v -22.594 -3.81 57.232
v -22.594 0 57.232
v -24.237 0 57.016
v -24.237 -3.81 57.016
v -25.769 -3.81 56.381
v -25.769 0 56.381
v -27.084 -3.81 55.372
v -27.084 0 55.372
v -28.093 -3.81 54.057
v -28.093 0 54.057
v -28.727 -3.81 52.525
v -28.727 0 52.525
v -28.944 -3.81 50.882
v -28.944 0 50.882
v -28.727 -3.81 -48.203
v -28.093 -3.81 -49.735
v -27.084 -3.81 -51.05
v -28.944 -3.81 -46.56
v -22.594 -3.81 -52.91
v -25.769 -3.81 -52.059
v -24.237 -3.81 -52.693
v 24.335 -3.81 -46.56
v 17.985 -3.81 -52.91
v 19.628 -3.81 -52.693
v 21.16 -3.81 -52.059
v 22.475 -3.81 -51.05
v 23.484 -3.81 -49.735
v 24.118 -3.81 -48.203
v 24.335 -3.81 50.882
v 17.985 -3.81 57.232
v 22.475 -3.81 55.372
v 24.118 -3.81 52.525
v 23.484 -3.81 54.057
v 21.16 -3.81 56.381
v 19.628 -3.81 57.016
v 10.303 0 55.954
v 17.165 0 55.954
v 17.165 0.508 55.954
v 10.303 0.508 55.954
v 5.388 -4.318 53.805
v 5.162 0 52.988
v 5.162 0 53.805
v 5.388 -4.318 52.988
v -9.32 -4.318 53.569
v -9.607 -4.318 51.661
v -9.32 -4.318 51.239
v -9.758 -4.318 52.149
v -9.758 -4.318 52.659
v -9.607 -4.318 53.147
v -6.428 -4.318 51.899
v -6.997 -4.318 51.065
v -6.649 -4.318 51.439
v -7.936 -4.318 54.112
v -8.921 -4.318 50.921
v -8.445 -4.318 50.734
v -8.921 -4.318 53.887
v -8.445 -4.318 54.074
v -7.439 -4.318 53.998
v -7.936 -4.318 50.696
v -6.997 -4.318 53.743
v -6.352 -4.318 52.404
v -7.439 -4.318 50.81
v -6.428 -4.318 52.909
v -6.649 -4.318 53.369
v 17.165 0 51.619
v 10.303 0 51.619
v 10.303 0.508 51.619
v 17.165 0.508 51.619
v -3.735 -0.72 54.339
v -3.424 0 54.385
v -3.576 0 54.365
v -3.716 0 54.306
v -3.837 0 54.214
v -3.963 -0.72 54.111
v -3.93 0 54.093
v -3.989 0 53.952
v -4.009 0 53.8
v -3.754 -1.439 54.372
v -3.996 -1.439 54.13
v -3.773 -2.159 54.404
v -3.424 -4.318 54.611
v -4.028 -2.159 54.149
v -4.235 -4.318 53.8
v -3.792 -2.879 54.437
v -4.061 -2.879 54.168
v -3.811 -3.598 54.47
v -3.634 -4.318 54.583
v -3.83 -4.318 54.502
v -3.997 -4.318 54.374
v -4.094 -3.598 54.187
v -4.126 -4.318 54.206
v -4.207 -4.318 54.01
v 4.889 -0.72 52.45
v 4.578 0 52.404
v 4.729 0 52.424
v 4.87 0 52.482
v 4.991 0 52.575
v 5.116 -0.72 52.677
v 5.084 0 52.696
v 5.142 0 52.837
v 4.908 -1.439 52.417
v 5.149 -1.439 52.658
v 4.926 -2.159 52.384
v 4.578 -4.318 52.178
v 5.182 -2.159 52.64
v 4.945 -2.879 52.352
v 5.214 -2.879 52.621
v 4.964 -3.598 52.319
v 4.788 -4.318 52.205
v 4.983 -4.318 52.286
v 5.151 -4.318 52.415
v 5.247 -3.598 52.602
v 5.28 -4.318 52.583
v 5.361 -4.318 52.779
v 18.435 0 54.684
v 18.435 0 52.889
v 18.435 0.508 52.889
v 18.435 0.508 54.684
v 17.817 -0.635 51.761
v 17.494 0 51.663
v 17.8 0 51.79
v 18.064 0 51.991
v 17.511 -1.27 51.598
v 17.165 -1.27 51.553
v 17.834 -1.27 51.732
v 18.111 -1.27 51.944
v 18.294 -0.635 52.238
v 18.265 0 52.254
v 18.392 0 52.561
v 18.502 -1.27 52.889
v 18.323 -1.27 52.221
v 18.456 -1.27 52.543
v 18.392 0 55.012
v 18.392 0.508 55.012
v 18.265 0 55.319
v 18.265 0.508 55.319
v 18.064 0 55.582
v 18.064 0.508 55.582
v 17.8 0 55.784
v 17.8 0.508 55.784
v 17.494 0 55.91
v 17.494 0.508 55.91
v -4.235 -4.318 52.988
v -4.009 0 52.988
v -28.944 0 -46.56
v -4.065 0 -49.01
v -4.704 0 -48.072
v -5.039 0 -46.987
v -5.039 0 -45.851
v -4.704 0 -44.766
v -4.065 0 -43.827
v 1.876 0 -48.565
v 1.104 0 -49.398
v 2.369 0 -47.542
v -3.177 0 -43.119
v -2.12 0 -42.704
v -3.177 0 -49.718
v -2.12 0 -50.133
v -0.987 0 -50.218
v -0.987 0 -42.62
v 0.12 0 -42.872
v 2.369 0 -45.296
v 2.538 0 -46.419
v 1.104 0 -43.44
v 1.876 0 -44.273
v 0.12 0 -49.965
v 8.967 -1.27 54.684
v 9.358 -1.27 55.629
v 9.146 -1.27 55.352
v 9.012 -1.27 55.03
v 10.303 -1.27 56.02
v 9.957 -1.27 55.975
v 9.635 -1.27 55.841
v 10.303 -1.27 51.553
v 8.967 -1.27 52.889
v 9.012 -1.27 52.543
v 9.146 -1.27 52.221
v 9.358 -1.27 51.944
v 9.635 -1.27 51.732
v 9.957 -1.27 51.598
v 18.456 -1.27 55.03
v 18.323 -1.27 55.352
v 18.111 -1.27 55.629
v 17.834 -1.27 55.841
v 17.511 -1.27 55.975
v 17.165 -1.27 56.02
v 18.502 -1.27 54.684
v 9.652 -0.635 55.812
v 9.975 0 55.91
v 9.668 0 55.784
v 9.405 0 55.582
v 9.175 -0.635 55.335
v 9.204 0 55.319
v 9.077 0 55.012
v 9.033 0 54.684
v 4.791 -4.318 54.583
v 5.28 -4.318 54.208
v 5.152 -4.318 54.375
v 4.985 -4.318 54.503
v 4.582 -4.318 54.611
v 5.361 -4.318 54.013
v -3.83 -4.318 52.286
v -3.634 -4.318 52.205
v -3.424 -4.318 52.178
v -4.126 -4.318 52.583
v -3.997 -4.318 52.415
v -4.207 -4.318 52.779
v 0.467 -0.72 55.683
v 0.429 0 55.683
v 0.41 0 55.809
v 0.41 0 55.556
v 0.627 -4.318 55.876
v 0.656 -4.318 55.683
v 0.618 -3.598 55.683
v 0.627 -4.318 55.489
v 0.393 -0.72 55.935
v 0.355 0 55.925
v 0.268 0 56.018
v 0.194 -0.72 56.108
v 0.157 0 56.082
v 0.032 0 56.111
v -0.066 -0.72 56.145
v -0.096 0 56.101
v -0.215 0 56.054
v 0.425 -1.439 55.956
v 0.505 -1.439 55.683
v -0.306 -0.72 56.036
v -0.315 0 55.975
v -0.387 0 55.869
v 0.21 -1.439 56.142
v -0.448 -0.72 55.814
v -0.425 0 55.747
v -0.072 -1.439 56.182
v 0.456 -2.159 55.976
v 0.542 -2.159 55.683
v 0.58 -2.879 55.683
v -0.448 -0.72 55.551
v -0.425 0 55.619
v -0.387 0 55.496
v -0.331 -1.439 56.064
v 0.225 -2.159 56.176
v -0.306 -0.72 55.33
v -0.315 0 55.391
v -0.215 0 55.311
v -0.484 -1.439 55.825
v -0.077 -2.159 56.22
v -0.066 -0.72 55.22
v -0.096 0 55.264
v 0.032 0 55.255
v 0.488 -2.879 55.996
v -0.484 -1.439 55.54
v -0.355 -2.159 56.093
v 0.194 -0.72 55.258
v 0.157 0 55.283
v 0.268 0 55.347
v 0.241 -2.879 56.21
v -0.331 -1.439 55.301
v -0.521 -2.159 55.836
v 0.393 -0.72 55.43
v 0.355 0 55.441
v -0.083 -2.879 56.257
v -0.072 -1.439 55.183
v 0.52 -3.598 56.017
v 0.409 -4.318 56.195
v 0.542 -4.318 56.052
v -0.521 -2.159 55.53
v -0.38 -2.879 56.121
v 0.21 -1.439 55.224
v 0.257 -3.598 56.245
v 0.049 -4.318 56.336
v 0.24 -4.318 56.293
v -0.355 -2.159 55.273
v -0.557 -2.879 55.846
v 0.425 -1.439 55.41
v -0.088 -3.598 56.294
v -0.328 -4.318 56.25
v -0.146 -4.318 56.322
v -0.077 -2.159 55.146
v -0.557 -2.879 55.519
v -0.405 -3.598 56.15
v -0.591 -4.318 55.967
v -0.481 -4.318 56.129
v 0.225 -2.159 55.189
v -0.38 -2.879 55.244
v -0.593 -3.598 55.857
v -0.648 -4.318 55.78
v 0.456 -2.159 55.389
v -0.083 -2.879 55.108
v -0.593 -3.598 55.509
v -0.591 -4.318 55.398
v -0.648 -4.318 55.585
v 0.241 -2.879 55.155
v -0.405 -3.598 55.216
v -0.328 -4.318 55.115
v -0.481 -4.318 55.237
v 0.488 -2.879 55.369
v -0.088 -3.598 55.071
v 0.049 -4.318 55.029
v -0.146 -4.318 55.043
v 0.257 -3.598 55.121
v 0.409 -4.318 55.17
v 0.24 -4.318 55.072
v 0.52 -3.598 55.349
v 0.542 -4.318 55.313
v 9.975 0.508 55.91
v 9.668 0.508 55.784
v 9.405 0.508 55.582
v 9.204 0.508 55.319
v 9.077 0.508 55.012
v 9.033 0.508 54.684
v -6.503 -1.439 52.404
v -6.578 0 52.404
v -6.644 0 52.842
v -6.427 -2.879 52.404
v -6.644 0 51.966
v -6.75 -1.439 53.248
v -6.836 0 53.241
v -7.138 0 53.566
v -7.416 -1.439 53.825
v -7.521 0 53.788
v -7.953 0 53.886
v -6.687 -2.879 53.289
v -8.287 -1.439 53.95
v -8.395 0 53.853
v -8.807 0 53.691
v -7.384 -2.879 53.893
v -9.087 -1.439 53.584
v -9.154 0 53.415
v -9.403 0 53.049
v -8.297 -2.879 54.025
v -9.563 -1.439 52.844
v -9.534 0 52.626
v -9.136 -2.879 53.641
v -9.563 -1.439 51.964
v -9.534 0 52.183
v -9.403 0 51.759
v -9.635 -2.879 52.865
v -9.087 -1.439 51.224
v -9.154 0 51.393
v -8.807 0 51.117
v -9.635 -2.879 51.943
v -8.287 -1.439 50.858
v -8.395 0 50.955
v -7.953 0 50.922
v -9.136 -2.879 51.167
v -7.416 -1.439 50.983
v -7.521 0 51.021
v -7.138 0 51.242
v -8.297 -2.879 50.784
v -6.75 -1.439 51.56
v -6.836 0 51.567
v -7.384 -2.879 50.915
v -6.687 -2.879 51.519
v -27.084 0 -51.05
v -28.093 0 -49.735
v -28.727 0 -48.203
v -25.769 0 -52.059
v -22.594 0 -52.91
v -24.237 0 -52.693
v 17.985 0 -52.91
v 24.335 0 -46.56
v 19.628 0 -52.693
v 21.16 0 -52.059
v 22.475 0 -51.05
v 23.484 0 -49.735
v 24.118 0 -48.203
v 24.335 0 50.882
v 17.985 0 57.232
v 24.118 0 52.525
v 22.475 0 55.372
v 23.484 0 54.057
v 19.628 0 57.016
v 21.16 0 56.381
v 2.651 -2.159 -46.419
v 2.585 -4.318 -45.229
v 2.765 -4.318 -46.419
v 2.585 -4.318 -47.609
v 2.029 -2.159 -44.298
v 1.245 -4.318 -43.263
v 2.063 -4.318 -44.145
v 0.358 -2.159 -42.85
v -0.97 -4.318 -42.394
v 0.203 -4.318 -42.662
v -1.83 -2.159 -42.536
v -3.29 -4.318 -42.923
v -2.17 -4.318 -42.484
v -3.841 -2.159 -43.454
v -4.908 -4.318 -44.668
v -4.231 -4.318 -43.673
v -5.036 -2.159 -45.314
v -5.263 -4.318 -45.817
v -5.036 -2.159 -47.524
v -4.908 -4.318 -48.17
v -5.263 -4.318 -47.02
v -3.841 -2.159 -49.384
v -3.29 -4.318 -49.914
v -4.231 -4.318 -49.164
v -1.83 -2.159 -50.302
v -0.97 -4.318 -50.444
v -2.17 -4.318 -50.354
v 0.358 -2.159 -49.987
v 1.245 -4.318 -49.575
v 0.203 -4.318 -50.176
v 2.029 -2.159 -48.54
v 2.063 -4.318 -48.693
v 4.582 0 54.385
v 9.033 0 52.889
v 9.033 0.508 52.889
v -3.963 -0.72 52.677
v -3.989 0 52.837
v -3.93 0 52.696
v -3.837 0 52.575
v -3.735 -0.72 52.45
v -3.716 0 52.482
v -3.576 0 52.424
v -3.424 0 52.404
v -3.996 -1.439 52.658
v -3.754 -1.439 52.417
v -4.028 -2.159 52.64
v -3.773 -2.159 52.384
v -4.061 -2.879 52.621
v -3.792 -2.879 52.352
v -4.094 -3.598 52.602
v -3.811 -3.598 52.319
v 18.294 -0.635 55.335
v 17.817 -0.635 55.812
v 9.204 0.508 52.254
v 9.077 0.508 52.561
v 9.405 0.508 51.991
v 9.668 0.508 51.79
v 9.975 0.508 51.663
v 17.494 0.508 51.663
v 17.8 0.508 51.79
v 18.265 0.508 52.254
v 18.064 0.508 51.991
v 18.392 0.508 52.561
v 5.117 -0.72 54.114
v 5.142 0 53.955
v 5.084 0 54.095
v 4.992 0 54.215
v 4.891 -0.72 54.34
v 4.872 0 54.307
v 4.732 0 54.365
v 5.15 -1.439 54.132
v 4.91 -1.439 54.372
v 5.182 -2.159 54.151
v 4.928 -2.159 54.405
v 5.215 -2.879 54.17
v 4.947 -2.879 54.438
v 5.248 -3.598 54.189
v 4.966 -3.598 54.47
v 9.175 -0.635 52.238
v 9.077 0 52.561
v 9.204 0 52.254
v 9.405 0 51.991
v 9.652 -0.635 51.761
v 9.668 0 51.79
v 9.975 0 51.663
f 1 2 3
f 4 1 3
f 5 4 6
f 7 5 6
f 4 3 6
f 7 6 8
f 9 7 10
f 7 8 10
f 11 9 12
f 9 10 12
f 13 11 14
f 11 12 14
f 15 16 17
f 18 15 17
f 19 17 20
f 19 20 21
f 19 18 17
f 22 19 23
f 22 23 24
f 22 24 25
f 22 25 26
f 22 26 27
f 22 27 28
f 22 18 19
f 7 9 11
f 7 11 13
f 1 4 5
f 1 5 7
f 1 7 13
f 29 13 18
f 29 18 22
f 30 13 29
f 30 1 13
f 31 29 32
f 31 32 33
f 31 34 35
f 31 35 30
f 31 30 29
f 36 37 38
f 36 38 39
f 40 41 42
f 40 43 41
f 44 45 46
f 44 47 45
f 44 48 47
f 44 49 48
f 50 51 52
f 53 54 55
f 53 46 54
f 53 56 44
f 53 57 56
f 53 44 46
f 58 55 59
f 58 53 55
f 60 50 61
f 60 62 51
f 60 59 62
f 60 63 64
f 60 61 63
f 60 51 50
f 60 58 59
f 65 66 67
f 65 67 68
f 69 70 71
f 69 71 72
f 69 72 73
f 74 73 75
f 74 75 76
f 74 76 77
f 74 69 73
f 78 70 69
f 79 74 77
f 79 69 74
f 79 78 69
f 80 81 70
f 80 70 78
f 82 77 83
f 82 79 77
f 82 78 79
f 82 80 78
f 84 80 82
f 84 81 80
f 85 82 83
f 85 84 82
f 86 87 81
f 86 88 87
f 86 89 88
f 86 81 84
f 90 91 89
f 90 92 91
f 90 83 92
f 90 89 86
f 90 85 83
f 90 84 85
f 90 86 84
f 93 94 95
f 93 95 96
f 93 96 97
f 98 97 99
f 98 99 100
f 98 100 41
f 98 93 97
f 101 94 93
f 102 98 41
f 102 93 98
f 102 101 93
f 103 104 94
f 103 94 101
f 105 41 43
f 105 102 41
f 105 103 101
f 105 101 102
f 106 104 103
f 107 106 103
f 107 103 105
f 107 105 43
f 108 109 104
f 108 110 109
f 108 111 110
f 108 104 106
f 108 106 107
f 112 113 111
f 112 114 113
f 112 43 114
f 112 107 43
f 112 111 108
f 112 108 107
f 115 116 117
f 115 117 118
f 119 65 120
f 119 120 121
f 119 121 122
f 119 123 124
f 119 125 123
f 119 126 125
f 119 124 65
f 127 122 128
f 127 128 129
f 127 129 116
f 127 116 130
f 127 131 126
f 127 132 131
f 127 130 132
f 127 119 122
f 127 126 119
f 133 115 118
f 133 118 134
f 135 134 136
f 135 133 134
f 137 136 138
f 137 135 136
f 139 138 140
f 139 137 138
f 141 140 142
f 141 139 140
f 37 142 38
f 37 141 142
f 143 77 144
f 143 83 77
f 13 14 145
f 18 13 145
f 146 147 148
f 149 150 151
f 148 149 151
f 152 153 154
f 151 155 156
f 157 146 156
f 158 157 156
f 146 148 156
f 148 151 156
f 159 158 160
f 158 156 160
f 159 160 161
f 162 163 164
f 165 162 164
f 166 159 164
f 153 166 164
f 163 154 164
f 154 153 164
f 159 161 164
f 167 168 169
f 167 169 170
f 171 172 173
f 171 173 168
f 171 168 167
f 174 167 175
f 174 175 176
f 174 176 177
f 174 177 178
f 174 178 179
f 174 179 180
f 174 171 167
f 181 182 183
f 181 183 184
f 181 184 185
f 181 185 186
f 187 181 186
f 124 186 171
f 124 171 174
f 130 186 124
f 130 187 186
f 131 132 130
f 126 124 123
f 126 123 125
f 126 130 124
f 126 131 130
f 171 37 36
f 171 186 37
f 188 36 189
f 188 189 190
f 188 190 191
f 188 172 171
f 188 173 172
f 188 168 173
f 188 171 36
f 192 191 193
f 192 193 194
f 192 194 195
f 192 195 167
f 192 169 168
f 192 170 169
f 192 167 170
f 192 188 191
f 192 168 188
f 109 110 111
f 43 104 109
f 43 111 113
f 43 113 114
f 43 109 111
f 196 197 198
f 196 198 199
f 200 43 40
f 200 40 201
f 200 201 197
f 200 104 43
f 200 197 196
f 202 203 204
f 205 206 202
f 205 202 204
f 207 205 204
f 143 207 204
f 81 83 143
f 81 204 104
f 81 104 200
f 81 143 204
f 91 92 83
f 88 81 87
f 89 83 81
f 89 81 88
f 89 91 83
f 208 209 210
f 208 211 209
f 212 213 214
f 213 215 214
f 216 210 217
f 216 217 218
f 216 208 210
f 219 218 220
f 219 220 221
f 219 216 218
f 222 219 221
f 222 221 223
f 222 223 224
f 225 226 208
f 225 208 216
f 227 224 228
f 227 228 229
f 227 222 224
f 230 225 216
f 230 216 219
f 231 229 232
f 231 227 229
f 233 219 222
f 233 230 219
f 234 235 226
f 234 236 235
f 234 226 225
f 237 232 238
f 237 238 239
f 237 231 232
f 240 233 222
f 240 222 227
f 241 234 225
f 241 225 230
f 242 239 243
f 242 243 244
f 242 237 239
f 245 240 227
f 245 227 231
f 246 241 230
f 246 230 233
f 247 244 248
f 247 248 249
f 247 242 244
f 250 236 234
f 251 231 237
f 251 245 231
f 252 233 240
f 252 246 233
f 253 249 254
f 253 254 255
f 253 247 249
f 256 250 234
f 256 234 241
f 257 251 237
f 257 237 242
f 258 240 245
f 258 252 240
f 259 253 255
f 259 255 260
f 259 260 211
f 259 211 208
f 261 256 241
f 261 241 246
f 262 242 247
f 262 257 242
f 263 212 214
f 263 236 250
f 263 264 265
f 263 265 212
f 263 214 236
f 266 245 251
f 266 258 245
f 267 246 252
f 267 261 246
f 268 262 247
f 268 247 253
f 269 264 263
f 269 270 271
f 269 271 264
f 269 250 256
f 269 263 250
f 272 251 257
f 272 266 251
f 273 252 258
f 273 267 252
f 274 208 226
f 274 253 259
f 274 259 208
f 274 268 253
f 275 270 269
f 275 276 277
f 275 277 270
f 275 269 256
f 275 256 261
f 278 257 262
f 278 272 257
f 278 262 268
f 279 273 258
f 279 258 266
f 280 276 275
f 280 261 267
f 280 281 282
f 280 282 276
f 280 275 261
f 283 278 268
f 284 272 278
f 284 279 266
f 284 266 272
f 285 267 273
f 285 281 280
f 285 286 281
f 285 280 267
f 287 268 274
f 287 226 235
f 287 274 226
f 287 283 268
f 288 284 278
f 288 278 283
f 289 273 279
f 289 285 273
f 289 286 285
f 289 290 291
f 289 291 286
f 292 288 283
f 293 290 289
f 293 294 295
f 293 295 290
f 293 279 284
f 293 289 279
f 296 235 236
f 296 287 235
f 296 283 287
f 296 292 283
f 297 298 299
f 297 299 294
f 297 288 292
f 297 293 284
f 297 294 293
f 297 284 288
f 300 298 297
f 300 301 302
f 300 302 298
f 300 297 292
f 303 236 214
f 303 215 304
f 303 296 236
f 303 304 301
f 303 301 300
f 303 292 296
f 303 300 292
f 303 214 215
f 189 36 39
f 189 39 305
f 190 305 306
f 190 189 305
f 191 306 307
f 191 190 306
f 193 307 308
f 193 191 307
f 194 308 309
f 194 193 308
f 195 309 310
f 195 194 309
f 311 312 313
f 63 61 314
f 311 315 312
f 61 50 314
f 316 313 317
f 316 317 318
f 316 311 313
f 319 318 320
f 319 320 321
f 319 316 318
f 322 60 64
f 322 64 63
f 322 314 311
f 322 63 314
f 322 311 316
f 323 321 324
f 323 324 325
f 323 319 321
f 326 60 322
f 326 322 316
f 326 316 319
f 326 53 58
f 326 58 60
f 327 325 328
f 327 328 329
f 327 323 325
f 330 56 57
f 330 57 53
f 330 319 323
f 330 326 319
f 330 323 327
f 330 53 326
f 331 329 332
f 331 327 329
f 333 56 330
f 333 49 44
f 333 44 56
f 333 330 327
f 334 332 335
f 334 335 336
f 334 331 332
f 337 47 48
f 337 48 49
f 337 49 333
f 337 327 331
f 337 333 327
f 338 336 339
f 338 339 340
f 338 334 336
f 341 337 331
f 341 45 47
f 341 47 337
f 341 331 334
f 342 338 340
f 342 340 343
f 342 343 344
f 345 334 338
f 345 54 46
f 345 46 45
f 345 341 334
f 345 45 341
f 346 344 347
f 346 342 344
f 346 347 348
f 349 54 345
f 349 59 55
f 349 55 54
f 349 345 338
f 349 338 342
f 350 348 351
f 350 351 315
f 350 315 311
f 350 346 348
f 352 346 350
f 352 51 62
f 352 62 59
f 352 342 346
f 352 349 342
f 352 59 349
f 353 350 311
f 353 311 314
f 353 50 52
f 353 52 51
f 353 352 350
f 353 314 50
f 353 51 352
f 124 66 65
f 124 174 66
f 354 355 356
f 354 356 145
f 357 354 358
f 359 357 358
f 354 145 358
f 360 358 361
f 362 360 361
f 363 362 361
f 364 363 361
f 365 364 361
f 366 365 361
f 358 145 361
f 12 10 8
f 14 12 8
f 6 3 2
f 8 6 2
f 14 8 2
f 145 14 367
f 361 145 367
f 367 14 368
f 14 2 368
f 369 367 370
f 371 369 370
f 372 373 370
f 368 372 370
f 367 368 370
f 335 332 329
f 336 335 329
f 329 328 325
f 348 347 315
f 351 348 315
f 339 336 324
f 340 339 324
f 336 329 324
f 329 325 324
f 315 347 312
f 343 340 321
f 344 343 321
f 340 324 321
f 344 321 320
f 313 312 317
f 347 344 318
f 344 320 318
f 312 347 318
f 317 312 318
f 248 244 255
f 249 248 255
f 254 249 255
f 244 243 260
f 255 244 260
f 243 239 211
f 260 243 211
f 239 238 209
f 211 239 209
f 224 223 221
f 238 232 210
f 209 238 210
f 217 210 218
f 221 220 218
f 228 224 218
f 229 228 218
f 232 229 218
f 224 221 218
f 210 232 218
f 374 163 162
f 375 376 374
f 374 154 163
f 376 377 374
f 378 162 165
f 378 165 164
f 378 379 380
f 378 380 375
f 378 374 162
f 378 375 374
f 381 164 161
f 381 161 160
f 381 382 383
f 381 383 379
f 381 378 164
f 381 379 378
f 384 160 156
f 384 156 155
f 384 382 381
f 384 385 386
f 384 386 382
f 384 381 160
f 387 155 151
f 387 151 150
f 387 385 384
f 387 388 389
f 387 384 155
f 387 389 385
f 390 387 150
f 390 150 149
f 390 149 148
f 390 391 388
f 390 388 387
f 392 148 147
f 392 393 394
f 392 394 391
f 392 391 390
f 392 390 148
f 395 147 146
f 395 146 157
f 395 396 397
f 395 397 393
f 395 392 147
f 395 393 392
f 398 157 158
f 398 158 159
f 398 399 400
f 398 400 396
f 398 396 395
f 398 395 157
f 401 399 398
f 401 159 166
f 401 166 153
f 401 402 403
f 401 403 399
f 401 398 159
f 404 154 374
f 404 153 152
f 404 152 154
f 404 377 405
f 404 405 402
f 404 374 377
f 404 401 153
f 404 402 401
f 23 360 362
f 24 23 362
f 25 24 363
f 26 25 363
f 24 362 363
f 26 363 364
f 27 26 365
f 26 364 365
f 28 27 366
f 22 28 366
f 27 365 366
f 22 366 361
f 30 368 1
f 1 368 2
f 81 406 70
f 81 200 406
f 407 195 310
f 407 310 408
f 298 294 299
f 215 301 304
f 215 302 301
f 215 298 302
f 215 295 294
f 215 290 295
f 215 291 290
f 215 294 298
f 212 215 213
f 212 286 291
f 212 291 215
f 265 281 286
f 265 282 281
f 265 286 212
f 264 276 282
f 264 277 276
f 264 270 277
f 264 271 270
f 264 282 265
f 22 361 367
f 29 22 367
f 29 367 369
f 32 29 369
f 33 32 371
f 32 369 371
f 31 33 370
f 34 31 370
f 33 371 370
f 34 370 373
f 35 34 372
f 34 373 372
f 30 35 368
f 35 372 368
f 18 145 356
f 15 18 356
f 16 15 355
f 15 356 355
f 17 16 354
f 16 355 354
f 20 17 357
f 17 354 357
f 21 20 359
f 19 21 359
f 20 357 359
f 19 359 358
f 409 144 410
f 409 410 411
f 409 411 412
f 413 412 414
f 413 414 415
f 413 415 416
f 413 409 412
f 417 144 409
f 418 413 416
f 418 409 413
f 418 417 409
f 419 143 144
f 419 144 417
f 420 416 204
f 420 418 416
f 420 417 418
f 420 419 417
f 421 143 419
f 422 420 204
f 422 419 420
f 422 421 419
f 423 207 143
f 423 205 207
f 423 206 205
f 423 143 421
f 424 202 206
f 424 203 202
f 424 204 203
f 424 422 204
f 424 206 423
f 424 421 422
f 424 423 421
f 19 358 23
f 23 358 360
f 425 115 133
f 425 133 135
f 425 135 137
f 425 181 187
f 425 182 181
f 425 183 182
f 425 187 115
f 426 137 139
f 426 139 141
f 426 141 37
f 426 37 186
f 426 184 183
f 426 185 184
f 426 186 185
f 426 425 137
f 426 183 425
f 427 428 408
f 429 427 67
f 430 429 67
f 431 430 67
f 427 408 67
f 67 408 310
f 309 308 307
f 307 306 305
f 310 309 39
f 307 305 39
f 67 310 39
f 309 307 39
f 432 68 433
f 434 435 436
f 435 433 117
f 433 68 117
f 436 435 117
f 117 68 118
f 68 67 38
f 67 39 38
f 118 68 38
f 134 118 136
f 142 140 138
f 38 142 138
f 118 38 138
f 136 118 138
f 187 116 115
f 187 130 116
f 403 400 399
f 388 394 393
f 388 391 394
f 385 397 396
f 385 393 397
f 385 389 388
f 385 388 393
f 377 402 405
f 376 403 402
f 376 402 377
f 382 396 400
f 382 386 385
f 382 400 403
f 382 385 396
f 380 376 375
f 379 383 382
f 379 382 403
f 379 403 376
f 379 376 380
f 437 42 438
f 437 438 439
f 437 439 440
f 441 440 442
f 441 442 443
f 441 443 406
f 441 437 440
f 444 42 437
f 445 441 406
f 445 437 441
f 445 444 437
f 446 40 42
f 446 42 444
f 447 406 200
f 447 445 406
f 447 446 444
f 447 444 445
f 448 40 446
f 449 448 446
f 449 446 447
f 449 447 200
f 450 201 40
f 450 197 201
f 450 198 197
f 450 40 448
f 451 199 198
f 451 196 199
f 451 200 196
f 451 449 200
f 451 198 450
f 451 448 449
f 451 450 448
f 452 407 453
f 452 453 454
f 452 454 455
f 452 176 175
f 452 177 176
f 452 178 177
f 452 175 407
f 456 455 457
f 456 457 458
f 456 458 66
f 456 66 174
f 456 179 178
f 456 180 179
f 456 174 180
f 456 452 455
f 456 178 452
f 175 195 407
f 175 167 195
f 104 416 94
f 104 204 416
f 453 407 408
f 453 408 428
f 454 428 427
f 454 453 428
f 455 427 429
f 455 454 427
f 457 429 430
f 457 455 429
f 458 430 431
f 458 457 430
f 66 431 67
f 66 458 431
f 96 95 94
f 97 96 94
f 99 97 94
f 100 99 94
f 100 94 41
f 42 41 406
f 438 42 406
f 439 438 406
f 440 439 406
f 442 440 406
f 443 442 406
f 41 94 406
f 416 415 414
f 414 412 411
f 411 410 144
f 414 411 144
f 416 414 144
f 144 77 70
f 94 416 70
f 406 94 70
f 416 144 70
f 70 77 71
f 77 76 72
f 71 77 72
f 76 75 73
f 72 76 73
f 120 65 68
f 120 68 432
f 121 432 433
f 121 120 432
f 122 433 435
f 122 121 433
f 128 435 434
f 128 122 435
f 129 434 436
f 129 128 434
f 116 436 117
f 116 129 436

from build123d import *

# Parameters (mm, degrees)
F1_DEPTH      = 3.81
F2_R          = 1.4863157011
F3_DEPTH      = 4.318
F3_TAPER      = -3
F2_R_2        = 0.429331494
F2_R_3        = 3.81
F5_DEPTH      = 1.27
F5_TAPER      = -3
F5_DEPTH_BACK = 0.508


with BuildPart() as f1:
    # F0 (on Front) → F1 (new body)
    with BuildSketch(Plane.XZ):
        with BuildLine():
            Line((13.9290312469, 57.2319371462), (-22.5937100291, 57.2319371462))
            ThreePointArc((-22.5937100291, 57.2319371462), (-27.0838380897, 55.3720652067), (-28.9437100291, 50.8819371462))
            Line((-28.9437100291, 50.8819371462), (-28.9437100291, -46.5598398983))
            ThreePointArc((-28.9437100291, -46.5598398983), (-27.0838380897, -51.0499679589), (-22.5937100291, -52.9098398983))
            Line((-22.5937100291, -52.9098398983), (17.9848404765, -52.9098398983))
            ThreePointArc((17.9848404765, -52.9098398983), (22.474968537, -51.0499679589), (24.3348404765, -46.5598398983))
            Line((24.3348404765, -46.5598398983), (24.3348404765, 50.8819371462))
            ThreePointArc((24.3348404765, 50.8819371462), (22.474968537, 55.3720652067), (17.9848404765, 57.2319371462))
            Line((17.9848404765, 57.2319371462), (16.8787086546, 57.2319371462))
            Line((16.8787086546, 57.2319371462), (13.9290312469, 57.2319371462))
        make_face()
    extrude(amount=F1_DEPTH)


with BuildPart() as f3:
    # F2 (on Front) → F3 (new body)
    with BuildSketch(Plane.XZ):
        with Locations((-8.0643091105, 52.4040772826)):
            Circle(F2_R)
    extrude(amount=F3_DEPTH, taper=F3_TAPER)


with BuildPart() as f3b:
    # F2 (on Front) → F3, piece 2 (new body)
    with BuildSketch(Plane.XZ):
        with BuildLine():
            Line((4.5818735962, 54.3846786022), (-3.424302442, 54.3846786022))
            ThreePointArc((-3.424302442, 54.3846786022), (-3.8373942236, 54.2135703838), (-4.008502442, 53.8004786022))
            Line((-4.008502442, 53.8004786022), (-4.008502442, 52.9882772826))
            ThreePointArc((-4.008502442, 52.9882772826), (-3.8373942236, 52.575185501), (-3.424302442, 52.4040772826))
            Line((-3.424302442, 52.4040772826), (4.5777363949, 52.4040772826))
            ThreePointArc((4.5777363949, 52.4040772826), (4.9908281764, 52.575185501), (5.1619363949, 52.9882772826))
            Line((5.1619363949, 52.9882772826), (5.1619363949, 53.8046158035))
            ThreePointArc((5.1619363949, 53.8046158035), (4.9920399346, 54.214782142), (4.5818735962, 54.3846786022))
        make_face()
    extrude(amount=F3_DEPTH, taper=F3_TAPER)


with BuildPart() as f3c:
    # F2 (on Front) → F3, piece 3 (new body)
    with BuildSketch(Plane.XZ):
        with Locations((0, 55.6826740503)):
            Circle(F2_R_2)
    extrude(amount=F3_DEPTH, taper=F3_TAPER)


with BuildPart() as f3d:
    # F2 (on Front) → F3, piece 4 (new body)
    with BuildSketch(Plane.XZ):
        with Locations((-1.2717708014, -46.4188568294)):
            Circle(F2_R_3)
    extrude(amount=F3_DEPTH, taper=F3_TAPER)


with BuildPart() as f5:
    # F4 (on Front) → F5 (new body, two sides)
    with BuildSketch(Plane.XZ) as f5_sk:
        with BuildLine():
            Line((10.3033875269, 51.6193546355), (17.1654837984, 51.6193546355))
            ThreePointArc((17.1654837984, 51.6193546355), (18.0635094105, 51.9913290234), (18.4354837984, 52.8893546355))
            Line((18.4354837984, 52.8893546355), (18.4354837984, 54.6837463758))
            ThreePointArc((18.4354837984, 54.6837463758), (18.0635094105, 55.5817719879), (17.1654837984, 55.9537463758))
            Line((17.1654837984, 55.9537463758), (10.3033875269, 55.9537463758))
            ThreePointArc((10.3033875269, 55.9537463758), (9.4053619148, 55.5817719879), (9.0333875269, 54.6837463758))
            Line((9.0333875269, 54.6837463758), (9.0333875269, 52.8893546355))
            ThreePointArc((9.0333875269, 52.8893546355), (9.4053619148, 51.9913290234), (10.3033875269, 51.6193546355))
        make_face()
    extrude(amount=F5_DEPTH, taper=F5_TAPER)
    extrude(f5_sk.sketch, amount=-F5_DEPTH_BACK)


solid = Compound([f1.part, f3.part, f3b.part, f3c.part, f3d.part, f5.part])
